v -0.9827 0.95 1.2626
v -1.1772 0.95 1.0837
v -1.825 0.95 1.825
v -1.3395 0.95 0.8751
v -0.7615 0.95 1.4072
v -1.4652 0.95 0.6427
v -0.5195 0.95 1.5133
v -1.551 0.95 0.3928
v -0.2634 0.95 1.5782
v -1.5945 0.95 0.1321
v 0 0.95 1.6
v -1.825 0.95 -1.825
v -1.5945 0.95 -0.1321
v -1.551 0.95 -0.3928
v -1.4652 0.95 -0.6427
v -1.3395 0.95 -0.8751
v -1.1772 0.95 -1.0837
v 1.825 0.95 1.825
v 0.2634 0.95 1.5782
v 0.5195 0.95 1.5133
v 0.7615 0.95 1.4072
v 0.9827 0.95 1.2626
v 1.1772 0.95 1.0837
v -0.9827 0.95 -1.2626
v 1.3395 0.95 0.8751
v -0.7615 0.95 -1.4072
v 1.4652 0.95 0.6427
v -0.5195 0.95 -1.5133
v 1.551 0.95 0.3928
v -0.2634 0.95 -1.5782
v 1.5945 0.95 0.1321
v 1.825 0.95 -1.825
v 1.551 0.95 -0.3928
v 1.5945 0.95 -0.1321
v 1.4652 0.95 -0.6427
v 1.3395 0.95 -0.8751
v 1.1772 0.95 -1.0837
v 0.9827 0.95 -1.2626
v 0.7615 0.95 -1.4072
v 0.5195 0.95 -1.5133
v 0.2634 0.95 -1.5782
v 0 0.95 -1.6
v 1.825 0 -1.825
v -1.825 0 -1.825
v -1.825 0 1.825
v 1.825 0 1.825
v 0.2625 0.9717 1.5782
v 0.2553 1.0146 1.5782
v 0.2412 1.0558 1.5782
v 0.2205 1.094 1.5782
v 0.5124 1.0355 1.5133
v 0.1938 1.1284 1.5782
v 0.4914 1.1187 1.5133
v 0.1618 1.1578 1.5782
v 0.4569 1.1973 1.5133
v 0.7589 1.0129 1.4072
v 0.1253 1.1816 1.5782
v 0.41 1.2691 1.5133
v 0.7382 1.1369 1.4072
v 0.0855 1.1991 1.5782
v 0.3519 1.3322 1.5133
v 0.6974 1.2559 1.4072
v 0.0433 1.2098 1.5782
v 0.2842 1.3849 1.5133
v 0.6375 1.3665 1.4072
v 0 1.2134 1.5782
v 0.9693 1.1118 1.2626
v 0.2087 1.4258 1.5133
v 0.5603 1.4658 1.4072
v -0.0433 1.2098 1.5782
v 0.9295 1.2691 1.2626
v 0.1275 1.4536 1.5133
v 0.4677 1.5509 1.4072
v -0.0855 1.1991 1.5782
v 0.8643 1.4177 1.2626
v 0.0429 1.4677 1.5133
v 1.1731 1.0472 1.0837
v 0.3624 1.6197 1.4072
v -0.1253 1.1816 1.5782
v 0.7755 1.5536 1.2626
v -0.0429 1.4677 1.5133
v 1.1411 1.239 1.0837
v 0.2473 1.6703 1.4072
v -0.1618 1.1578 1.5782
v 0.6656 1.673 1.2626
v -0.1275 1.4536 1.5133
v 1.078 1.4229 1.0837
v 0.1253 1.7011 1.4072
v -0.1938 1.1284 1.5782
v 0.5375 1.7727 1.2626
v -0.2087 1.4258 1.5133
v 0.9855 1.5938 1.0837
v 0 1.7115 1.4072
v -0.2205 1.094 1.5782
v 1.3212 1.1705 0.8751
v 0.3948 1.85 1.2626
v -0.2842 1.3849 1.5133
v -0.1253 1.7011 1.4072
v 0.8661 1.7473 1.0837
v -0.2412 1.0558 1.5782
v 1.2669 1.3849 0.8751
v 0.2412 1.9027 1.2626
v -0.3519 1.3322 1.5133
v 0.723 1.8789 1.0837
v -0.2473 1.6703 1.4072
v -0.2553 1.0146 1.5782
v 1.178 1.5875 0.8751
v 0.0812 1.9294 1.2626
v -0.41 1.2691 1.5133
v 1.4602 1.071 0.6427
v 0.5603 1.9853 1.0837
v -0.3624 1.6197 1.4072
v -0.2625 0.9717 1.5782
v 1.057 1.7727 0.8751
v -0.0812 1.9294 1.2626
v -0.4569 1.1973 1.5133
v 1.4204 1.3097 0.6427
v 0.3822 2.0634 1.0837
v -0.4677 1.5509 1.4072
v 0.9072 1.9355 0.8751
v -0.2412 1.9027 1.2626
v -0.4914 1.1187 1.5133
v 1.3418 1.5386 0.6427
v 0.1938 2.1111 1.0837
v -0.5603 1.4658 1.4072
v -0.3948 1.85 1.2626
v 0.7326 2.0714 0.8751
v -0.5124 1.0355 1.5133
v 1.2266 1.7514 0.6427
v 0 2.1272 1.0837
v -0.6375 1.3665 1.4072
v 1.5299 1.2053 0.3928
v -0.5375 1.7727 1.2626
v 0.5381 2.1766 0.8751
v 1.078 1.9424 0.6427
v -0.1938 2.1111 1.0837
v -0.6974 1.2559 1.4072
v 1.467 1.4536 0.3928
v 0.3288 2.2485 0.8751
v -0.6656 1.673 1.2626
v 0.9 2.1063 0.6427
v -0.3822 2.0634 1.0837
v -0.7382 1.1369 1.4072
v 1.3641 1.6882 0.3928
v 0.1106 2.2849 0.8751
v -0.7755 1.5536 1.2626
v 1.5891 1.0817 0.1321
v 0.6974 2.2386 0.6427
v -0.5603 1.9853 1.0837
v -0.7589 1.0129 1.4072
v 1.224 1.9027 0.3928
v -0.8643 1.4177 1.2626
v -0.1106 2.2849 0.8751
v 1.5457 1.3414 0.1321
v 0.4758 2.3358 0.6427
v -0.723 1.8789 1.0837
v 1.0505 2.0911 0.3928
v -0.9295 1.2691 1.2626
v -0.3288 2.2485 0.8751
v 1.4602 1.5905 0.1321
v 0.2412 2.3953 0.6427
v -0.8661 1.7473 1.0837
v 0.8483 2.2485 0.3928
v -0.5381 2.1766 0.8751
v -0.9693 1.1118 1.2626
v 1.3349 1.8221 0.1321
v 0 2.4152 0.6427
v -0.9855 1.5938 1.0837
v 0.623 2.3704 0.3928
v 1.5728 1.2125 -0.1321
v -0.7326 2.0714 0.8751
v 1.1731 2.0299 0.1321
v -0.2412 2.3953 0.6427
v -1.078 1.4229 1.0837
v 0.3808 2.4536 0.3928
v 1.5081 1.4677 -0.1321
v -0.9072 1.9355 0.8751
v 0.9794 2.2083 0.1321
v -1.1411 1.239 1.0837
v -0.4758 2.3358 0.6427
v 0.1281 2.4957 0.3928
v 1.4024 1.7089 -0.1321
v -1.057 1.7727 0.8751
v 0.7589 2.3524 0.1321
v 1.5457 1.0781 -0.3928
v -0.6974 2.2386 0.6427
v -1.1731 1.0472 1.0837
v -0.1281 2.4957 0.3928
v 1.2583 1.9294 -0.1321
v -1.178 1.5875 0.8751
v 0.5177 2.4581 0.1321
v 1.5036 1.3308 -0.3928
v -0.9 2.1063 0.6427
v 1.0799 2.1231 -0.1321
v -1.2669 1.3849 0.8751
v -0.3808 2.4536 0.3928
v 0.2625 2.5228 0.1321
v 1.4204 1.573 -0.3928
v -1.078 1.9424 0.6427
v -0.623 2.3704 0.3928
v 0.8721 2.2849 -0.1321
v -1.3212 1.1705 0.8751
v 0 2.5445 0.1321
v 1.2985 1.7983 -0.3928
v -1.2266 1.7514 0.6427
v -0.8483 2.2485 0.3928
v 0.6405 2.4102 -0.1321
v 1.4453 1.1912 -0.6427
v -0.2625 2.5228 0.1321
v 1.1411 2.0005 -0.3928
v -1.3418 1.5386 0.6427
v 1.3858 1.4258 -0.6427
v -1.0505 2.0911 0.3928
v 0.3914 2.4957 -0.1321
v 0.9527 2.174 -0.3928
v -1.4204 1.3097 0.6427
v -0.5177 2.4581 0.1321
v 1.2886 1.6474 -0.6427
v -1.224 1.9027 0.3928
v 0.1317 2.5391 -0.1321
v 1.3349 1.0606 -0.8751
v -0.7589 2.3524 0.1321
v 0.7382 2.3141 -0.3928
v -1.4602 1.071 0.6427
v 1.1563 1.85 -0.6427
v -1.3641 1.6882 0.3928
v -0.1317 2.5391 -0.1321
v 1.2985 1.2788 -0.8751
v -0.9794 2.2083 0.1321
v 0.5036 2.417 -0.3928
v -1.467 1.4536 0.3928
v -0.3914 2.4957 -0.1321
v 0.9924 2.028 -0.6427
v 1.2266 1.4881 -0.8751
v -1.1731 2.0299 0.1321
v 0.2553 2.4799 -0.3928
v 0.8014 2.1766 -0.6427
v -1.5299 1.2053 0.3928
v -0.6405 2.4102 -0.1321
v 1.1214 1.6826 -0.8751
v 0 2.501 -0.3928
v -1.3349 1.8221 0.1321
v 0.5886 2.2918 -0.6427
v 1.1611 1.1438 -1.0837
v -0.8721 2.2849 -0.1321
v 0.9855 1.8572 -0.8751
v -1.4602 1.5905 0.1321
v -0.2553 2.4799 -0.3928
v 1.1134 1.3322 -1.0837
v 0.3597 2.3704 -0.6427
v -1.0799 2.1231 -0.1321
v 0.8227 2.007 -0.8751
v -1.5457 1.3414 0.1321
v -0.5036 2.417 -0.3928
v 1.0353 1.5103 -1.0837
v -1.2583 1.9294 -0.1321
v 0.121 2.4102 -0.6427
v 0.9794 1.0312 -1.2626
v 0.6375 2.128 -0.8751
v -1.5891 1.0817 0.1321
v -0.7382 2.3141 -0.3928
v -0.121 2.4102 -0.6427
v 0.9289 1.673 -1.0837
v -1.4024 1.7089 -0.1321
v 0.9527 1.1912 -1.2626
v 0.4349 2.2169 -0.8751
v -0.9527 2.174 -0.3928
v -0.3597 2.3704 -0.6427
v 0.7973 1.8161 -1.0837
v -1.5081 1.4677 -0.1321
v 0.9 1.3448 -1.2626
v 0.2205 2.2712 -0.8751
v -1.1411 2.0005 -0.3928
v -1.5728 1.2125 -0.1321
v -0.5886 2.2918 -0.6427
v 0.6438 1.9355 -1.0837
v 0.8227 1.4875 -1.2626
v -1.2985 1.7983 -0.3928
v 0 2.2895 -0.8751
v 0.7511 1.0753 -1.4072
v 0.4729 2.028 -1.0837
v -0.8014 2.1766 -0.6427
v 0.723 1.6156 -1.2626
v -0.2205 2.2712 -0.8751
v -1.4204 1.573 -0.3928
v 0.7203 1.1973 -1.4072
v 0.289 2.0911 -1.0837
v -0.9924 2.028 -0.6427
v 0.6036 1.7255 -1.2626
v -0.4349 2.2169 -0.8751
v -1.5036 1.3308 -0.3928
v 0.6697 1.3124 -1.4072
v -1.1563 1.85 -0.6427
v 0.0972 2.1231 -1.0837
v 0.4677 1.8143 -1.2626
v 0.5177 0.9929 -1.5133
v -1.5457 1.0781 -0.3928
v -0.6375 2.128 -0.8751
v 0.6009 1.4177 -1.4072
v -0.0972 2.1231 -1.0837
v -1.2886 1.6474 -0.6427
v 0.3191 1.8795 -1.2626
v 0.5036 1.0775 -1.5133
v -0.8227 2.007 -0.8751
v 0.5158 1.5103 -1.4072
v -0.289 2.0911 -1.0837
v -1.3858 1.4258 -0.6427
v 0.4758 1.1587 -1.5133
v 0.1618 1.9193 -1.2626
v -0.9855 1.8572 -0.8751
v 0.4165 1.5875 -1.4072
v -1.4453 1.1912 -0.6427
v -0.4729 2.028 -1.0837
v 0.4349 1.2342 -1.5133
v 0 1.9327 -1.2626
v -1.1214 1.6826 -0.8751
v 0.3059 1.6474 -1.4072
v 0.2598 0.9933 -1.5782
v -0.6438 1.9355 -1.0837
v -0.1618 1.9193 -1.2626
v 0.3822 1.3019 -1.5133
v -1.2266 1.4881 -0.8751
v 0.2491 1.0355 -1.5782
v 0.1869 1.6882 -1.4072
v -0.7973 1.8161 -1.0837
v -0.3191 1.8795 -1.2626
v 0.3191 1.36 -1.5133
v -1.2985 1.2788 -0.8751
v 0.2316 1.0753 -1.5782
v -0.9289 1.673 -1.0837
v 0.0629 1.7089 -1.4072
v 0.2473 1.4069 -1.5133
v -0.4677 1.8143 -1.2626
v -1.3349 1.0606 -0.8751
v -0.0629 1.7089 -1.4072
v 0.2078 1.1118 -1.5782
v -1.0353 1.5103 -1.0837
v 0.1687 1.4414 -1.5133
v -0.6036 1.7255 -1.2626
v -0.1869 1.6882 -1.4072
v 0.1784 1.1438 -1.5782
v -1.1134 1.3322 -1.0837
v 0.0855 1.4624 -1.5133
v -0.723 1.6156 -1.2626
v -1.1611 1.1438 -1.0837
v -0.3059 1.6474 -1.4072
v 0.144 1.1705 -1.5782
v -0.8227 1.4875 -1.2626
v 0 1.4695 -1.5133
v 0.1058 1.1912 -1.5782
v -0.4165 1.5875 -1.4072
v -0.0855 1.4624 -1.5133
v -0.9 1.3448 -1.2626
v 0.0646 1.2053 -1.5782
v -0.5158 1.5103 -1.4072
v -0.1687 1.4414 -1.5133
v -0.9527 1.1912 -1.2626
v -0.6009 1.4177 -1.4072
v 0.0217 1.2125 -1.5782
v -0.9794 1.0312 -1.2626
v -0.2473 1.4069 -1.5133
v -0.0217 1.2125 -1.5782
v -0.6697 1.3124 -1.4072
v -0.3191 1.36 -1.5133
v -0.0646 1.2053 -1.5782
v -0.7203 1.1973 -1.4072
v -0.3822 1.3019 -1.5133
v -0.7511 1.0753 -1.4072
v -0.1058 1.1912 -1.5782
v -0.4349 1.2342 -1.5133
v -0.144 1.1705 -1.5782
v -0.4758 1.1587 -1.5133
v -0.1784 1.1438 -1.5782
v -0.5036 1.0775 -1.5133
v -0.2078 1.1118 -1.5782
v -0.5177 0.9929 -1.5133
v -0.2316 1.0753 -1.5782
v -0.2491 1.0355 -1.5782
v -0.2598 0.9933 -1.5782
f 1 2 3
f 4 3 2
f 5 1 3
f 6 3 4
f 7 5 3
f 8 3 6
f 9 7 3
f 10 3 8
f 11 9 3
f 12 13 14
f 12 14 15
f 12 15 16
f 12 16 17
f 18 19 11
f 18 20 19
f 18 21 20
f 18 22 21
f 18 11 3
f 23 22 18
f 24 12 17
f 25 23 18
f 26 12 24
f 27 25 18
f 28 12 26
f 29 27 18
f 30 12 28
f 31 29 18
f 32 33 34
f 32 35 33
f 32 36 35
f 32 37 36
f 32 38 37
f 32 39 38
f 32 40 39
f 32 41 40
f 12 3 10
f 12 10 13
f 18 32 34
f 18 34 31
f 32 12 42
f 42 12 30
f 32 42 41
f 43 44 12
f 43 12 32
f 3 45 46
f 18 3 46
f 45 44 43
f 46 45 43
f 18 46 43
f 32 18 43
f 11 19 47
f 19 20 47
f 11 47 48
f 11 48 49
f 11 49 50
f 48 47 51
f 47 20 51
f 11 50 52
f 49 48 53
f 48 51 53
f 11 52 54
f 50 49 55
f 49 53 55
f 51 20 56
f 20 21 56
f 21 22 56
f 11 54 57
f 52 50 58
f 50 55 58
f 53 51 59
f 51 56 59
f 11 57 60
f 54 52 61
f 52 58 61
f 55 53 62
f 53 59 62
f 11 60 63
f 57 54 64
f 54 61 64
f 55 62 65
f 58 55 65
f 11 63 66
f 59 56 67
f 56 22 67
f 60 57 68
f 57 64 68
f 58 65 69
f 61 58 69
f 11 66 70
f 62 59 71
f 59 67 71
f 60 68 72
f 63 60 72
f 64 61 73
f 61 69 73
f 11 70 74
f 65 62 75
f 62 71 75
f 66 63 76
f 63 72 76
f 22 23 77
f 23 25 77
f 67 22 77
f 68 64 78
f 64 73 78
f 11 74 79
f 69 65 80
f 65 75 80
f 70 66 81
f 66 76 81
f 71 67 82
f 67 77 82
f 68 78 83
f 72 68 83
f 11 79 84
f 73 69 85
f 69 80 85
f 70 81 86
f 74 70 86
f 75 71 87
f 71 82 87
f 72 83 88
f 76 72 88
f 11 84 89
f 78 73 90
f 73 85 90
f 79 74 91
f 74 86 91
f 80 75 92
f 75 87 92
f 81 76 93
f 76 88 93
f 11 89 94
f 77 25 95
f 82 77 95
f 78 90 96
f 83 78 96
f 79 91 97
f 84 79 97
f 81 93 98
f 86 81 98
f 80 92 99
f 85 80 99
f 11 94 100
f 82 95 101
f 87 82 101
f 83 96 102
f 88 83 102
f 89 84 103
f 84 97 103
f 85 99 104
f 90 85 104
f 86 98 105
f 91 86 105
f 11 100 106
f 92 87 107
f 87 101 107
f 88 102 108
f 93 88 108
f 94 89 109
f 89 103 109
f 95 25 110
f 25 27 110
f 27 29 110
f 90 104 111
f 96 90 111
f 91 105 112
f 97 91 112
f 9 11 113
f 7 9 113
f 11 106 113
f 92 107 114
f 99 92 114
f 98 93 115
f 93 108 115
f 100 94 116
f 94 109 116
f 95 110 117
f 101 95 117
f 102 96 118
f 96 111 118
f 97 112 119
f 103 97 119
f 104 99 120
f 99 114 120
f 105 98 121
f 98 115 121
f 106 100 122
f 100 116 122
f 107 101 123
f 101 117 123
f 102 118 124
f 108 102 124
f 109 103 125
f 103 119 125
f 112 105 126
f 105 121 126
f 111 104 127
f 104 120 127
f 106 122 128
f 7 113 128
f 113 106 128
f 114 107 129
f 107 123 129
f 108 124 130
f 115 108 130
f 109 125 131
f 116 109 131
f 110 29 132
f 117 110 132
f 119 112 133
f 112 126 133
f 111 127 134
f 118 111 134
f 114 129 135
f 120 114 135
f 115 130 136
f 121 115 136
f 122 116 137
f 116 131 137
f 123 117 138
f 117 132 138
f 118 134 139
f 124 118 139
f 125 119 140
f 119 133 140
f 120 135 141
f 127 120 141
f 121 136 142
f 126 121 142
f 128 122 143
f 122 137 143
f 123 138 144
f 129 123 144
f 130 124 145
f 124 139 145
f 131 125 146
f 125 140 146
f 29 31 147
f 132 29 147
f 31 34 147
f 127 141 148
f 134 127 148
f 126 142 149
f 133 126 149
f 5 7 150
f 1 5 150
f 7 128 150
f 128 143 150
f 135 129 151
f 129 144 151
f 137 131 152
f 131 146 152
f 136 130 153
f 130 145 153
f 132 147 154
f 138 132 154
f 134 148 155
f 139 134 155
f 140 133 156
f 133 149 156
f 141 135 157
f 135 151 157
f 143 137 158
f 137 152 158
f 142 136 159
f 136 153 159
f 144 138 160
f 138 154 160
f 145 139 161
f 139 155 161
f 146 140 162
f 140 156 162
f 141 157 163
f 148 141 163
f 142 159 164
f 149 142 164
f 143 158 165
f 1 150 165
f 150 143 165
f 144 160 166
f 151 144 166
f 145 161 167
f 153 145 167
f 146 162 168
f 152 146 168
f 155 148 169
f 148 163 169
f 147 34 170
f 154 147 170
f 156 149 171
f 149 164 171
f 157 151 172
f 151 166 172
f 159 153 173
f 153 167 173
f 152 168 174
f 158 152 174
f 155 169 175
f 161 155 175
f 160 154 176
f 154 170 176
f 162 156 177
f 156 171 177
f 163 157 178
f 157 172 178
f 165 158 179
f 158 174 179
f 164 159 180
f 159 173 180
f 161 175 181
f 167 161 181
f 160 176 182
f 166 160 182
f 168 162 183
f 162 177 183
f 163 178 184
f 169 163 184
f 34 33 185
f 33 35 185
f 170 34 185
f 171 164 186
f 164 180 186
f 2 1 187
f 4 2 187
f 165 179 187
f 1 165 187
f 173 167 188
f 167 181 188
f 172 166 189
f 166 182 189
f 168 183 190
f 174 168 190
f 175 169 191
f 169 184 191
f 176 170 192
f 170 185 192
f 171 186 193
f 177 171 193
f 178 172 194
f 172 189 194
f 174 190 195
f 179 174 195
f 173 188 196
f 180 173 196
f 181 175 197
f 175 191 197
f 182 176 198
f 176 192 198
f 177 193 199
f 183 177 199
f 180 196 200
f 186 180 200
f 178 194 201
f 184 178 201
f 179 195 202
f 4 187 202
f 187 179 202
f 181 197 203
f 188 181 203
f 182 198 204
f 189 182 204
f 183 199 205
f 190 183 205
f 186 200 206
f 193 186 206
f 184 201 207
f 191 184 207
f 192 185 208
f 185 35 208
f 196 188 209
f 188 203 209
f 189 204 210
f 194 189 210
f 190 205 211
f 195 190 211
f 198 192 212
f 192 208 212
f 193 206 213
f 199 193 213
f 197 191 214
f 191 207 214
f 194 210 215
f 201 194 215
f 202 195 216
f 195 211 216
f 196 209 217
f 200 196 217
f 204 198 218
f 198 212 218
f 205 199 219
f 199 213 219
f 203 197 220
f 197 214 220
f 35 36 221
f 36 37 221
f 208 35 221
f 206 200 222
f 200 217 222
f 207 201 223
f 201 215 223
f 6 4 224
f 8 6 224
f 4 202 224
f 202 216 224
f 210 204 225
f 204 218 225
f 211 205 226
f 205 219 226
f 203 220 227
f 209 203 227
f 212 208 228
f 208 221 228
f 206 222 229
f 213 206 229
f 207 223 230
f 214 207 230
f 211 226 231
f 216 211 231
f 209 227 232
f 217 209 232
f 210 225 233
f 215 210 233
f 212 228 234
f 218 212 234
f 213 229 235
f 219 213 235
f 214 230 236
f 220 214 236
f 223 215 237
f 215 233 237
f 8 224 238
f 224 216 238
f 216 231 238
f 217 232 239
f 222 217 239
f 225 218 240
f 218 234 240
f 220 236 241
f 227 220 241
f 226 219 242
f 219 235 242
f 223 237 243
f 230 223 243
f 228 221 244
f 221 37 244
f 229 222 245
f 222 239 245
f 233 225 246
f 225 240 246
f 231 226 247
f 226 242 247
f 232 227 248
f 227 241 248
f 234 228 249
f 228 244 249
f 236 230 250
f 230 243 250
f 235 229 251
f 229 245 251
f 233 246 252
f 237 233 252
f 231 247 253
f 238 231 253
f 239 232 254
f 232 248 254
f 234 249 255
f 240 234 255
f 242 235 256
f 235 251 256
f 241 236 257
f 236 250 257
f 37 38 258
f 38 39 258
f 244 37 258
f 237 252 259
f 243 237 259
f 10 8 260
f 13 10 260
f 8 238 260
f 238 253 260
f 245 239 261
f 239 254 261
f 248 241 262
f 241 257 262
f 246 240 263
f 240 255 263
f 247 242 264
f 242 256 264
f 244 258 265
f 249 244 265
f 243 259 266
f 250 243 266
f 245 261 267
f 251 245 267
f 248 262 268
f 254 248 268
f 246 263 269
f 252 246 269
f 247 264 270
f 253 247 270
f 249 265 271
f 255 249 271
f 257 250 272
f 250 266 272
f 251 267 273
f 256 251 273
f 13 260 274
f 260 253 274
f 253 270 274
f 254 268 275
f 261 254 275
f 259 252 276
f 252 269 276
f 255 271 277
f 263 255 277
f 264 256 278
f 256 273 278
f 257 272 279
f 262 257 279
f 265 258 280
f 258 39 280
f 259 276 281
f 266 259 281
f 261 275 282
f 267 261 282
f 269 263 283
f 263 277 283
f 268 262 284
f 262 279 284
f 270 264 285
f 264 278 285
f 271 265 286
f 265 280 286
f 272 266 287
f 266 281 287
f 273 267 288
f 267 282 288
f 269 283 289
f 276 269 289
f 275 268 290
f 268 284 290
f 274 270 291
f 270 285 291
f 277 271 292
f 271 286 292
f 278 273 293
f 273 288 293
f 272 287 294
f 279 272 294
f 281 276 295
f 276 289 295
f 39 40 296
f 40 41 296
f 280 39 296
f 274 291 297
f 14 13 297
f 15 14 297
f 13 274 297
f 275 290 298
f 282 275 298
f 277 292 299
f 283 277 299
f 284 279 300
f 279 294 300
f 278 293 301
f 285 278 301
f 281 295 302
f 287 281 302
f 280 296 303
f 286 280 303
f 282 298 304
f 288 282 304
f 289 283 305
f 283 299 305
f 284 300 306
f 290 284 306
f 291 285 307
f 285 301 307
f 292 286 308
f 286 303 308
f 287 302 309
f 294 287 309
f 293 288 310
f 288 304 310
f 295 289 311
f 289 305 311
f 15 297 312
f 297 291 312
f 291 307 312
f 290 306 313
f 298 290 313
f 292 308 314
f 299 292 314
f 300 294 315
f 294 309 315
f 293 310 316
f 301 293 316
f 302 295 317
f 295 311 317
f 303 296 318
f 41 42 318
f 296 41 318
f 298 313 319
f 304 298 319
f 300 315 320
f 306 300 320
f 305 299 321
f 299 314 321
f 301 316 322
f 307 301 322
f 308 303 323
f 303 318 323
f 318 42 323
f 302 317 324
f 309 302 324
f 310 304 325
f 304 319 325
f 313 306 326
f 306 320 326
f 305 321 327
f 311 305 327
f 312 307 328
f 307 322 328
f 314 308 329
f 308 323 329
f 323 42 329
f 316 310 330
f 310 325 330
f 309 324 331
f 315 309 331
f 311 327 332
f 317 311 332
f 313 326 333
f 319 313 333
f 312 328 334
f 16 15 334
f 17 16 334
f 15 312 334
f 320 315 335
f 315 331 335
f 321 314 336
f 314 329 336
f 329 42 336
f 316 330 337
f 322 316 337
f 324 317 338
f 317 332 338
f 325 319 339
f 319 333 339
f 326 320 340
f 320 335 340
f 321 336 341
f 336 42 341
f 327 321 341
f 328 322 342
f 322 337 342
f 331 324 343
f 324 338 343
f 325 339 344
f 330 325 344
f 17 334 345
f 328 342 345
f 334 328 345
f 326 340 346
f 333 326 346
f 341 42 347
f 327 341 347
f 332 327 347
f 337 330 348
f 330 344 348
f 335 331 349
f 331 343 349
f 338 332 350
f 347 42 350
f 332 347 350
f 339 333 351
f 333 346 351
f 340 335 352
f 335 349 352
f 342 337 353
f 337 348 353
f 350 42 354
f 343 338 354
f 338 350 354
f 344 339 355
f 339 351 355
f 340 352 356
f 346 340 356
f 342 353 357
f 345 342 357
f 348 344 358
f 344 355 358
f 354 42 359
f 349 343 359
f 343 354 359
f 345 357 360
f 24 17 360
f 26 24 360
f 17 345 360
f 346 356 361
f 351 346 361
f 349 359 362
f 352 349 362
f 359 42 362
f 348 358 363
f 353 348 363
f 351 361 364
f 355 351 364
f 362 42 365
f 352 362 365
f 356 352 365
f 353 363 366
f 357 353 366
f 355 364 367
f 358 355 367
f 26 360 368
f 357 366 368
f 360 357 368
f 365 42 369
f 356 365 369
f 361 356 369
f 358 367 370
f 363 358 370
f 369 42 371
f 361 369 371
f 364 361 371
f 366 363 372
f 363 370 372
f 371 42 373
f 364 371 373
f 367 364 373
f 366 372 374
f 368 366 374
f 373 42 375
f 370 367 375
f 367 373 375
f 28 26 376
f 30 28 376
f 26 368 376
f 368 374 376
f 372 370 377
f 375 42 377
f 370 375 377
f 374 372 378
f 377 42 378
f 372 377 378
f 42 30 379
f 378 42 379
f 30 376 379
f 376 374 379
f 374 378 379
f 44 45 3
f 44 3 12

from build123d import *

# Parameters (mm, degrees)
SKETCH1_W           = 3.65
SKETCH1_H           = 3.65
BOSS_EXTRUDE1_DEPTH = 0.95
REVOLVE1_ANGLE      = 180


with BuildPart() as part:
    # Sketch1 → Boss-Extrude1 (new body)
    with BuildSketch(Plane(origin=(0, 0, 0), x_dir=(1, 0, 0), z_dir=(0, 1, 0))):
        Rectangle(SKETCH1_W, SKETCH1_H)
    extrude(amount=BOSS_EXTRUDE1_DEPTH)

    # Sketch2 → Revolve1 (revolve)
    with BuildSketch(Plane(origin=(0, 0.95, 0), x_dir=(1, 0, 0), z_dir=(0, 1, 0))):
        with BuildLine():
            Line((0, 1.6), (0, -1.6))
            ThreePointArc((0, -1.6), (1.6, 0), (0, 1.6))
        make_face()
    revolve(axis=Axis((0, 0.95, -1.6), (0, 0, 1)), revolution_arc=REVOLVE1_ANGLE)


solid = part.part
